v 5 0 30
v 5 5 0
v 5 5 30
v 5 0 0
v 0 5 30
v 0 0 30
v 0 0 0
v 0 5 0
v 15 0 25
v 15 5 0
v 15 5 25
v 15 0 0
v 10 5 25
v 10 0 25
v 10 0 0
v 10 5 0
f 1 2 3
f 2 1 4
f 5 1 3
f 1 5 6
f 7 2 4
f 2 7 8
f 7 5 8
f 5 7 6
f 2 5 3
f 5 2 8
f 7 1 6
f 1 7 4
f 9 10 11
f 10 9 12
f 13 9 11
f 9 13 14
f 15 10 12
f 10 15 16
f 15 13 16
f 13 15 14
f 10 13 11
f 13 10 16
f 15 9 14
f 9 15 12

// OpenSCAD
module link1() { cube([5, 5, 30]); }
module link2() { cube([5, 5, 25]); }
link1();
translate([10, 0, 0]) link2();
